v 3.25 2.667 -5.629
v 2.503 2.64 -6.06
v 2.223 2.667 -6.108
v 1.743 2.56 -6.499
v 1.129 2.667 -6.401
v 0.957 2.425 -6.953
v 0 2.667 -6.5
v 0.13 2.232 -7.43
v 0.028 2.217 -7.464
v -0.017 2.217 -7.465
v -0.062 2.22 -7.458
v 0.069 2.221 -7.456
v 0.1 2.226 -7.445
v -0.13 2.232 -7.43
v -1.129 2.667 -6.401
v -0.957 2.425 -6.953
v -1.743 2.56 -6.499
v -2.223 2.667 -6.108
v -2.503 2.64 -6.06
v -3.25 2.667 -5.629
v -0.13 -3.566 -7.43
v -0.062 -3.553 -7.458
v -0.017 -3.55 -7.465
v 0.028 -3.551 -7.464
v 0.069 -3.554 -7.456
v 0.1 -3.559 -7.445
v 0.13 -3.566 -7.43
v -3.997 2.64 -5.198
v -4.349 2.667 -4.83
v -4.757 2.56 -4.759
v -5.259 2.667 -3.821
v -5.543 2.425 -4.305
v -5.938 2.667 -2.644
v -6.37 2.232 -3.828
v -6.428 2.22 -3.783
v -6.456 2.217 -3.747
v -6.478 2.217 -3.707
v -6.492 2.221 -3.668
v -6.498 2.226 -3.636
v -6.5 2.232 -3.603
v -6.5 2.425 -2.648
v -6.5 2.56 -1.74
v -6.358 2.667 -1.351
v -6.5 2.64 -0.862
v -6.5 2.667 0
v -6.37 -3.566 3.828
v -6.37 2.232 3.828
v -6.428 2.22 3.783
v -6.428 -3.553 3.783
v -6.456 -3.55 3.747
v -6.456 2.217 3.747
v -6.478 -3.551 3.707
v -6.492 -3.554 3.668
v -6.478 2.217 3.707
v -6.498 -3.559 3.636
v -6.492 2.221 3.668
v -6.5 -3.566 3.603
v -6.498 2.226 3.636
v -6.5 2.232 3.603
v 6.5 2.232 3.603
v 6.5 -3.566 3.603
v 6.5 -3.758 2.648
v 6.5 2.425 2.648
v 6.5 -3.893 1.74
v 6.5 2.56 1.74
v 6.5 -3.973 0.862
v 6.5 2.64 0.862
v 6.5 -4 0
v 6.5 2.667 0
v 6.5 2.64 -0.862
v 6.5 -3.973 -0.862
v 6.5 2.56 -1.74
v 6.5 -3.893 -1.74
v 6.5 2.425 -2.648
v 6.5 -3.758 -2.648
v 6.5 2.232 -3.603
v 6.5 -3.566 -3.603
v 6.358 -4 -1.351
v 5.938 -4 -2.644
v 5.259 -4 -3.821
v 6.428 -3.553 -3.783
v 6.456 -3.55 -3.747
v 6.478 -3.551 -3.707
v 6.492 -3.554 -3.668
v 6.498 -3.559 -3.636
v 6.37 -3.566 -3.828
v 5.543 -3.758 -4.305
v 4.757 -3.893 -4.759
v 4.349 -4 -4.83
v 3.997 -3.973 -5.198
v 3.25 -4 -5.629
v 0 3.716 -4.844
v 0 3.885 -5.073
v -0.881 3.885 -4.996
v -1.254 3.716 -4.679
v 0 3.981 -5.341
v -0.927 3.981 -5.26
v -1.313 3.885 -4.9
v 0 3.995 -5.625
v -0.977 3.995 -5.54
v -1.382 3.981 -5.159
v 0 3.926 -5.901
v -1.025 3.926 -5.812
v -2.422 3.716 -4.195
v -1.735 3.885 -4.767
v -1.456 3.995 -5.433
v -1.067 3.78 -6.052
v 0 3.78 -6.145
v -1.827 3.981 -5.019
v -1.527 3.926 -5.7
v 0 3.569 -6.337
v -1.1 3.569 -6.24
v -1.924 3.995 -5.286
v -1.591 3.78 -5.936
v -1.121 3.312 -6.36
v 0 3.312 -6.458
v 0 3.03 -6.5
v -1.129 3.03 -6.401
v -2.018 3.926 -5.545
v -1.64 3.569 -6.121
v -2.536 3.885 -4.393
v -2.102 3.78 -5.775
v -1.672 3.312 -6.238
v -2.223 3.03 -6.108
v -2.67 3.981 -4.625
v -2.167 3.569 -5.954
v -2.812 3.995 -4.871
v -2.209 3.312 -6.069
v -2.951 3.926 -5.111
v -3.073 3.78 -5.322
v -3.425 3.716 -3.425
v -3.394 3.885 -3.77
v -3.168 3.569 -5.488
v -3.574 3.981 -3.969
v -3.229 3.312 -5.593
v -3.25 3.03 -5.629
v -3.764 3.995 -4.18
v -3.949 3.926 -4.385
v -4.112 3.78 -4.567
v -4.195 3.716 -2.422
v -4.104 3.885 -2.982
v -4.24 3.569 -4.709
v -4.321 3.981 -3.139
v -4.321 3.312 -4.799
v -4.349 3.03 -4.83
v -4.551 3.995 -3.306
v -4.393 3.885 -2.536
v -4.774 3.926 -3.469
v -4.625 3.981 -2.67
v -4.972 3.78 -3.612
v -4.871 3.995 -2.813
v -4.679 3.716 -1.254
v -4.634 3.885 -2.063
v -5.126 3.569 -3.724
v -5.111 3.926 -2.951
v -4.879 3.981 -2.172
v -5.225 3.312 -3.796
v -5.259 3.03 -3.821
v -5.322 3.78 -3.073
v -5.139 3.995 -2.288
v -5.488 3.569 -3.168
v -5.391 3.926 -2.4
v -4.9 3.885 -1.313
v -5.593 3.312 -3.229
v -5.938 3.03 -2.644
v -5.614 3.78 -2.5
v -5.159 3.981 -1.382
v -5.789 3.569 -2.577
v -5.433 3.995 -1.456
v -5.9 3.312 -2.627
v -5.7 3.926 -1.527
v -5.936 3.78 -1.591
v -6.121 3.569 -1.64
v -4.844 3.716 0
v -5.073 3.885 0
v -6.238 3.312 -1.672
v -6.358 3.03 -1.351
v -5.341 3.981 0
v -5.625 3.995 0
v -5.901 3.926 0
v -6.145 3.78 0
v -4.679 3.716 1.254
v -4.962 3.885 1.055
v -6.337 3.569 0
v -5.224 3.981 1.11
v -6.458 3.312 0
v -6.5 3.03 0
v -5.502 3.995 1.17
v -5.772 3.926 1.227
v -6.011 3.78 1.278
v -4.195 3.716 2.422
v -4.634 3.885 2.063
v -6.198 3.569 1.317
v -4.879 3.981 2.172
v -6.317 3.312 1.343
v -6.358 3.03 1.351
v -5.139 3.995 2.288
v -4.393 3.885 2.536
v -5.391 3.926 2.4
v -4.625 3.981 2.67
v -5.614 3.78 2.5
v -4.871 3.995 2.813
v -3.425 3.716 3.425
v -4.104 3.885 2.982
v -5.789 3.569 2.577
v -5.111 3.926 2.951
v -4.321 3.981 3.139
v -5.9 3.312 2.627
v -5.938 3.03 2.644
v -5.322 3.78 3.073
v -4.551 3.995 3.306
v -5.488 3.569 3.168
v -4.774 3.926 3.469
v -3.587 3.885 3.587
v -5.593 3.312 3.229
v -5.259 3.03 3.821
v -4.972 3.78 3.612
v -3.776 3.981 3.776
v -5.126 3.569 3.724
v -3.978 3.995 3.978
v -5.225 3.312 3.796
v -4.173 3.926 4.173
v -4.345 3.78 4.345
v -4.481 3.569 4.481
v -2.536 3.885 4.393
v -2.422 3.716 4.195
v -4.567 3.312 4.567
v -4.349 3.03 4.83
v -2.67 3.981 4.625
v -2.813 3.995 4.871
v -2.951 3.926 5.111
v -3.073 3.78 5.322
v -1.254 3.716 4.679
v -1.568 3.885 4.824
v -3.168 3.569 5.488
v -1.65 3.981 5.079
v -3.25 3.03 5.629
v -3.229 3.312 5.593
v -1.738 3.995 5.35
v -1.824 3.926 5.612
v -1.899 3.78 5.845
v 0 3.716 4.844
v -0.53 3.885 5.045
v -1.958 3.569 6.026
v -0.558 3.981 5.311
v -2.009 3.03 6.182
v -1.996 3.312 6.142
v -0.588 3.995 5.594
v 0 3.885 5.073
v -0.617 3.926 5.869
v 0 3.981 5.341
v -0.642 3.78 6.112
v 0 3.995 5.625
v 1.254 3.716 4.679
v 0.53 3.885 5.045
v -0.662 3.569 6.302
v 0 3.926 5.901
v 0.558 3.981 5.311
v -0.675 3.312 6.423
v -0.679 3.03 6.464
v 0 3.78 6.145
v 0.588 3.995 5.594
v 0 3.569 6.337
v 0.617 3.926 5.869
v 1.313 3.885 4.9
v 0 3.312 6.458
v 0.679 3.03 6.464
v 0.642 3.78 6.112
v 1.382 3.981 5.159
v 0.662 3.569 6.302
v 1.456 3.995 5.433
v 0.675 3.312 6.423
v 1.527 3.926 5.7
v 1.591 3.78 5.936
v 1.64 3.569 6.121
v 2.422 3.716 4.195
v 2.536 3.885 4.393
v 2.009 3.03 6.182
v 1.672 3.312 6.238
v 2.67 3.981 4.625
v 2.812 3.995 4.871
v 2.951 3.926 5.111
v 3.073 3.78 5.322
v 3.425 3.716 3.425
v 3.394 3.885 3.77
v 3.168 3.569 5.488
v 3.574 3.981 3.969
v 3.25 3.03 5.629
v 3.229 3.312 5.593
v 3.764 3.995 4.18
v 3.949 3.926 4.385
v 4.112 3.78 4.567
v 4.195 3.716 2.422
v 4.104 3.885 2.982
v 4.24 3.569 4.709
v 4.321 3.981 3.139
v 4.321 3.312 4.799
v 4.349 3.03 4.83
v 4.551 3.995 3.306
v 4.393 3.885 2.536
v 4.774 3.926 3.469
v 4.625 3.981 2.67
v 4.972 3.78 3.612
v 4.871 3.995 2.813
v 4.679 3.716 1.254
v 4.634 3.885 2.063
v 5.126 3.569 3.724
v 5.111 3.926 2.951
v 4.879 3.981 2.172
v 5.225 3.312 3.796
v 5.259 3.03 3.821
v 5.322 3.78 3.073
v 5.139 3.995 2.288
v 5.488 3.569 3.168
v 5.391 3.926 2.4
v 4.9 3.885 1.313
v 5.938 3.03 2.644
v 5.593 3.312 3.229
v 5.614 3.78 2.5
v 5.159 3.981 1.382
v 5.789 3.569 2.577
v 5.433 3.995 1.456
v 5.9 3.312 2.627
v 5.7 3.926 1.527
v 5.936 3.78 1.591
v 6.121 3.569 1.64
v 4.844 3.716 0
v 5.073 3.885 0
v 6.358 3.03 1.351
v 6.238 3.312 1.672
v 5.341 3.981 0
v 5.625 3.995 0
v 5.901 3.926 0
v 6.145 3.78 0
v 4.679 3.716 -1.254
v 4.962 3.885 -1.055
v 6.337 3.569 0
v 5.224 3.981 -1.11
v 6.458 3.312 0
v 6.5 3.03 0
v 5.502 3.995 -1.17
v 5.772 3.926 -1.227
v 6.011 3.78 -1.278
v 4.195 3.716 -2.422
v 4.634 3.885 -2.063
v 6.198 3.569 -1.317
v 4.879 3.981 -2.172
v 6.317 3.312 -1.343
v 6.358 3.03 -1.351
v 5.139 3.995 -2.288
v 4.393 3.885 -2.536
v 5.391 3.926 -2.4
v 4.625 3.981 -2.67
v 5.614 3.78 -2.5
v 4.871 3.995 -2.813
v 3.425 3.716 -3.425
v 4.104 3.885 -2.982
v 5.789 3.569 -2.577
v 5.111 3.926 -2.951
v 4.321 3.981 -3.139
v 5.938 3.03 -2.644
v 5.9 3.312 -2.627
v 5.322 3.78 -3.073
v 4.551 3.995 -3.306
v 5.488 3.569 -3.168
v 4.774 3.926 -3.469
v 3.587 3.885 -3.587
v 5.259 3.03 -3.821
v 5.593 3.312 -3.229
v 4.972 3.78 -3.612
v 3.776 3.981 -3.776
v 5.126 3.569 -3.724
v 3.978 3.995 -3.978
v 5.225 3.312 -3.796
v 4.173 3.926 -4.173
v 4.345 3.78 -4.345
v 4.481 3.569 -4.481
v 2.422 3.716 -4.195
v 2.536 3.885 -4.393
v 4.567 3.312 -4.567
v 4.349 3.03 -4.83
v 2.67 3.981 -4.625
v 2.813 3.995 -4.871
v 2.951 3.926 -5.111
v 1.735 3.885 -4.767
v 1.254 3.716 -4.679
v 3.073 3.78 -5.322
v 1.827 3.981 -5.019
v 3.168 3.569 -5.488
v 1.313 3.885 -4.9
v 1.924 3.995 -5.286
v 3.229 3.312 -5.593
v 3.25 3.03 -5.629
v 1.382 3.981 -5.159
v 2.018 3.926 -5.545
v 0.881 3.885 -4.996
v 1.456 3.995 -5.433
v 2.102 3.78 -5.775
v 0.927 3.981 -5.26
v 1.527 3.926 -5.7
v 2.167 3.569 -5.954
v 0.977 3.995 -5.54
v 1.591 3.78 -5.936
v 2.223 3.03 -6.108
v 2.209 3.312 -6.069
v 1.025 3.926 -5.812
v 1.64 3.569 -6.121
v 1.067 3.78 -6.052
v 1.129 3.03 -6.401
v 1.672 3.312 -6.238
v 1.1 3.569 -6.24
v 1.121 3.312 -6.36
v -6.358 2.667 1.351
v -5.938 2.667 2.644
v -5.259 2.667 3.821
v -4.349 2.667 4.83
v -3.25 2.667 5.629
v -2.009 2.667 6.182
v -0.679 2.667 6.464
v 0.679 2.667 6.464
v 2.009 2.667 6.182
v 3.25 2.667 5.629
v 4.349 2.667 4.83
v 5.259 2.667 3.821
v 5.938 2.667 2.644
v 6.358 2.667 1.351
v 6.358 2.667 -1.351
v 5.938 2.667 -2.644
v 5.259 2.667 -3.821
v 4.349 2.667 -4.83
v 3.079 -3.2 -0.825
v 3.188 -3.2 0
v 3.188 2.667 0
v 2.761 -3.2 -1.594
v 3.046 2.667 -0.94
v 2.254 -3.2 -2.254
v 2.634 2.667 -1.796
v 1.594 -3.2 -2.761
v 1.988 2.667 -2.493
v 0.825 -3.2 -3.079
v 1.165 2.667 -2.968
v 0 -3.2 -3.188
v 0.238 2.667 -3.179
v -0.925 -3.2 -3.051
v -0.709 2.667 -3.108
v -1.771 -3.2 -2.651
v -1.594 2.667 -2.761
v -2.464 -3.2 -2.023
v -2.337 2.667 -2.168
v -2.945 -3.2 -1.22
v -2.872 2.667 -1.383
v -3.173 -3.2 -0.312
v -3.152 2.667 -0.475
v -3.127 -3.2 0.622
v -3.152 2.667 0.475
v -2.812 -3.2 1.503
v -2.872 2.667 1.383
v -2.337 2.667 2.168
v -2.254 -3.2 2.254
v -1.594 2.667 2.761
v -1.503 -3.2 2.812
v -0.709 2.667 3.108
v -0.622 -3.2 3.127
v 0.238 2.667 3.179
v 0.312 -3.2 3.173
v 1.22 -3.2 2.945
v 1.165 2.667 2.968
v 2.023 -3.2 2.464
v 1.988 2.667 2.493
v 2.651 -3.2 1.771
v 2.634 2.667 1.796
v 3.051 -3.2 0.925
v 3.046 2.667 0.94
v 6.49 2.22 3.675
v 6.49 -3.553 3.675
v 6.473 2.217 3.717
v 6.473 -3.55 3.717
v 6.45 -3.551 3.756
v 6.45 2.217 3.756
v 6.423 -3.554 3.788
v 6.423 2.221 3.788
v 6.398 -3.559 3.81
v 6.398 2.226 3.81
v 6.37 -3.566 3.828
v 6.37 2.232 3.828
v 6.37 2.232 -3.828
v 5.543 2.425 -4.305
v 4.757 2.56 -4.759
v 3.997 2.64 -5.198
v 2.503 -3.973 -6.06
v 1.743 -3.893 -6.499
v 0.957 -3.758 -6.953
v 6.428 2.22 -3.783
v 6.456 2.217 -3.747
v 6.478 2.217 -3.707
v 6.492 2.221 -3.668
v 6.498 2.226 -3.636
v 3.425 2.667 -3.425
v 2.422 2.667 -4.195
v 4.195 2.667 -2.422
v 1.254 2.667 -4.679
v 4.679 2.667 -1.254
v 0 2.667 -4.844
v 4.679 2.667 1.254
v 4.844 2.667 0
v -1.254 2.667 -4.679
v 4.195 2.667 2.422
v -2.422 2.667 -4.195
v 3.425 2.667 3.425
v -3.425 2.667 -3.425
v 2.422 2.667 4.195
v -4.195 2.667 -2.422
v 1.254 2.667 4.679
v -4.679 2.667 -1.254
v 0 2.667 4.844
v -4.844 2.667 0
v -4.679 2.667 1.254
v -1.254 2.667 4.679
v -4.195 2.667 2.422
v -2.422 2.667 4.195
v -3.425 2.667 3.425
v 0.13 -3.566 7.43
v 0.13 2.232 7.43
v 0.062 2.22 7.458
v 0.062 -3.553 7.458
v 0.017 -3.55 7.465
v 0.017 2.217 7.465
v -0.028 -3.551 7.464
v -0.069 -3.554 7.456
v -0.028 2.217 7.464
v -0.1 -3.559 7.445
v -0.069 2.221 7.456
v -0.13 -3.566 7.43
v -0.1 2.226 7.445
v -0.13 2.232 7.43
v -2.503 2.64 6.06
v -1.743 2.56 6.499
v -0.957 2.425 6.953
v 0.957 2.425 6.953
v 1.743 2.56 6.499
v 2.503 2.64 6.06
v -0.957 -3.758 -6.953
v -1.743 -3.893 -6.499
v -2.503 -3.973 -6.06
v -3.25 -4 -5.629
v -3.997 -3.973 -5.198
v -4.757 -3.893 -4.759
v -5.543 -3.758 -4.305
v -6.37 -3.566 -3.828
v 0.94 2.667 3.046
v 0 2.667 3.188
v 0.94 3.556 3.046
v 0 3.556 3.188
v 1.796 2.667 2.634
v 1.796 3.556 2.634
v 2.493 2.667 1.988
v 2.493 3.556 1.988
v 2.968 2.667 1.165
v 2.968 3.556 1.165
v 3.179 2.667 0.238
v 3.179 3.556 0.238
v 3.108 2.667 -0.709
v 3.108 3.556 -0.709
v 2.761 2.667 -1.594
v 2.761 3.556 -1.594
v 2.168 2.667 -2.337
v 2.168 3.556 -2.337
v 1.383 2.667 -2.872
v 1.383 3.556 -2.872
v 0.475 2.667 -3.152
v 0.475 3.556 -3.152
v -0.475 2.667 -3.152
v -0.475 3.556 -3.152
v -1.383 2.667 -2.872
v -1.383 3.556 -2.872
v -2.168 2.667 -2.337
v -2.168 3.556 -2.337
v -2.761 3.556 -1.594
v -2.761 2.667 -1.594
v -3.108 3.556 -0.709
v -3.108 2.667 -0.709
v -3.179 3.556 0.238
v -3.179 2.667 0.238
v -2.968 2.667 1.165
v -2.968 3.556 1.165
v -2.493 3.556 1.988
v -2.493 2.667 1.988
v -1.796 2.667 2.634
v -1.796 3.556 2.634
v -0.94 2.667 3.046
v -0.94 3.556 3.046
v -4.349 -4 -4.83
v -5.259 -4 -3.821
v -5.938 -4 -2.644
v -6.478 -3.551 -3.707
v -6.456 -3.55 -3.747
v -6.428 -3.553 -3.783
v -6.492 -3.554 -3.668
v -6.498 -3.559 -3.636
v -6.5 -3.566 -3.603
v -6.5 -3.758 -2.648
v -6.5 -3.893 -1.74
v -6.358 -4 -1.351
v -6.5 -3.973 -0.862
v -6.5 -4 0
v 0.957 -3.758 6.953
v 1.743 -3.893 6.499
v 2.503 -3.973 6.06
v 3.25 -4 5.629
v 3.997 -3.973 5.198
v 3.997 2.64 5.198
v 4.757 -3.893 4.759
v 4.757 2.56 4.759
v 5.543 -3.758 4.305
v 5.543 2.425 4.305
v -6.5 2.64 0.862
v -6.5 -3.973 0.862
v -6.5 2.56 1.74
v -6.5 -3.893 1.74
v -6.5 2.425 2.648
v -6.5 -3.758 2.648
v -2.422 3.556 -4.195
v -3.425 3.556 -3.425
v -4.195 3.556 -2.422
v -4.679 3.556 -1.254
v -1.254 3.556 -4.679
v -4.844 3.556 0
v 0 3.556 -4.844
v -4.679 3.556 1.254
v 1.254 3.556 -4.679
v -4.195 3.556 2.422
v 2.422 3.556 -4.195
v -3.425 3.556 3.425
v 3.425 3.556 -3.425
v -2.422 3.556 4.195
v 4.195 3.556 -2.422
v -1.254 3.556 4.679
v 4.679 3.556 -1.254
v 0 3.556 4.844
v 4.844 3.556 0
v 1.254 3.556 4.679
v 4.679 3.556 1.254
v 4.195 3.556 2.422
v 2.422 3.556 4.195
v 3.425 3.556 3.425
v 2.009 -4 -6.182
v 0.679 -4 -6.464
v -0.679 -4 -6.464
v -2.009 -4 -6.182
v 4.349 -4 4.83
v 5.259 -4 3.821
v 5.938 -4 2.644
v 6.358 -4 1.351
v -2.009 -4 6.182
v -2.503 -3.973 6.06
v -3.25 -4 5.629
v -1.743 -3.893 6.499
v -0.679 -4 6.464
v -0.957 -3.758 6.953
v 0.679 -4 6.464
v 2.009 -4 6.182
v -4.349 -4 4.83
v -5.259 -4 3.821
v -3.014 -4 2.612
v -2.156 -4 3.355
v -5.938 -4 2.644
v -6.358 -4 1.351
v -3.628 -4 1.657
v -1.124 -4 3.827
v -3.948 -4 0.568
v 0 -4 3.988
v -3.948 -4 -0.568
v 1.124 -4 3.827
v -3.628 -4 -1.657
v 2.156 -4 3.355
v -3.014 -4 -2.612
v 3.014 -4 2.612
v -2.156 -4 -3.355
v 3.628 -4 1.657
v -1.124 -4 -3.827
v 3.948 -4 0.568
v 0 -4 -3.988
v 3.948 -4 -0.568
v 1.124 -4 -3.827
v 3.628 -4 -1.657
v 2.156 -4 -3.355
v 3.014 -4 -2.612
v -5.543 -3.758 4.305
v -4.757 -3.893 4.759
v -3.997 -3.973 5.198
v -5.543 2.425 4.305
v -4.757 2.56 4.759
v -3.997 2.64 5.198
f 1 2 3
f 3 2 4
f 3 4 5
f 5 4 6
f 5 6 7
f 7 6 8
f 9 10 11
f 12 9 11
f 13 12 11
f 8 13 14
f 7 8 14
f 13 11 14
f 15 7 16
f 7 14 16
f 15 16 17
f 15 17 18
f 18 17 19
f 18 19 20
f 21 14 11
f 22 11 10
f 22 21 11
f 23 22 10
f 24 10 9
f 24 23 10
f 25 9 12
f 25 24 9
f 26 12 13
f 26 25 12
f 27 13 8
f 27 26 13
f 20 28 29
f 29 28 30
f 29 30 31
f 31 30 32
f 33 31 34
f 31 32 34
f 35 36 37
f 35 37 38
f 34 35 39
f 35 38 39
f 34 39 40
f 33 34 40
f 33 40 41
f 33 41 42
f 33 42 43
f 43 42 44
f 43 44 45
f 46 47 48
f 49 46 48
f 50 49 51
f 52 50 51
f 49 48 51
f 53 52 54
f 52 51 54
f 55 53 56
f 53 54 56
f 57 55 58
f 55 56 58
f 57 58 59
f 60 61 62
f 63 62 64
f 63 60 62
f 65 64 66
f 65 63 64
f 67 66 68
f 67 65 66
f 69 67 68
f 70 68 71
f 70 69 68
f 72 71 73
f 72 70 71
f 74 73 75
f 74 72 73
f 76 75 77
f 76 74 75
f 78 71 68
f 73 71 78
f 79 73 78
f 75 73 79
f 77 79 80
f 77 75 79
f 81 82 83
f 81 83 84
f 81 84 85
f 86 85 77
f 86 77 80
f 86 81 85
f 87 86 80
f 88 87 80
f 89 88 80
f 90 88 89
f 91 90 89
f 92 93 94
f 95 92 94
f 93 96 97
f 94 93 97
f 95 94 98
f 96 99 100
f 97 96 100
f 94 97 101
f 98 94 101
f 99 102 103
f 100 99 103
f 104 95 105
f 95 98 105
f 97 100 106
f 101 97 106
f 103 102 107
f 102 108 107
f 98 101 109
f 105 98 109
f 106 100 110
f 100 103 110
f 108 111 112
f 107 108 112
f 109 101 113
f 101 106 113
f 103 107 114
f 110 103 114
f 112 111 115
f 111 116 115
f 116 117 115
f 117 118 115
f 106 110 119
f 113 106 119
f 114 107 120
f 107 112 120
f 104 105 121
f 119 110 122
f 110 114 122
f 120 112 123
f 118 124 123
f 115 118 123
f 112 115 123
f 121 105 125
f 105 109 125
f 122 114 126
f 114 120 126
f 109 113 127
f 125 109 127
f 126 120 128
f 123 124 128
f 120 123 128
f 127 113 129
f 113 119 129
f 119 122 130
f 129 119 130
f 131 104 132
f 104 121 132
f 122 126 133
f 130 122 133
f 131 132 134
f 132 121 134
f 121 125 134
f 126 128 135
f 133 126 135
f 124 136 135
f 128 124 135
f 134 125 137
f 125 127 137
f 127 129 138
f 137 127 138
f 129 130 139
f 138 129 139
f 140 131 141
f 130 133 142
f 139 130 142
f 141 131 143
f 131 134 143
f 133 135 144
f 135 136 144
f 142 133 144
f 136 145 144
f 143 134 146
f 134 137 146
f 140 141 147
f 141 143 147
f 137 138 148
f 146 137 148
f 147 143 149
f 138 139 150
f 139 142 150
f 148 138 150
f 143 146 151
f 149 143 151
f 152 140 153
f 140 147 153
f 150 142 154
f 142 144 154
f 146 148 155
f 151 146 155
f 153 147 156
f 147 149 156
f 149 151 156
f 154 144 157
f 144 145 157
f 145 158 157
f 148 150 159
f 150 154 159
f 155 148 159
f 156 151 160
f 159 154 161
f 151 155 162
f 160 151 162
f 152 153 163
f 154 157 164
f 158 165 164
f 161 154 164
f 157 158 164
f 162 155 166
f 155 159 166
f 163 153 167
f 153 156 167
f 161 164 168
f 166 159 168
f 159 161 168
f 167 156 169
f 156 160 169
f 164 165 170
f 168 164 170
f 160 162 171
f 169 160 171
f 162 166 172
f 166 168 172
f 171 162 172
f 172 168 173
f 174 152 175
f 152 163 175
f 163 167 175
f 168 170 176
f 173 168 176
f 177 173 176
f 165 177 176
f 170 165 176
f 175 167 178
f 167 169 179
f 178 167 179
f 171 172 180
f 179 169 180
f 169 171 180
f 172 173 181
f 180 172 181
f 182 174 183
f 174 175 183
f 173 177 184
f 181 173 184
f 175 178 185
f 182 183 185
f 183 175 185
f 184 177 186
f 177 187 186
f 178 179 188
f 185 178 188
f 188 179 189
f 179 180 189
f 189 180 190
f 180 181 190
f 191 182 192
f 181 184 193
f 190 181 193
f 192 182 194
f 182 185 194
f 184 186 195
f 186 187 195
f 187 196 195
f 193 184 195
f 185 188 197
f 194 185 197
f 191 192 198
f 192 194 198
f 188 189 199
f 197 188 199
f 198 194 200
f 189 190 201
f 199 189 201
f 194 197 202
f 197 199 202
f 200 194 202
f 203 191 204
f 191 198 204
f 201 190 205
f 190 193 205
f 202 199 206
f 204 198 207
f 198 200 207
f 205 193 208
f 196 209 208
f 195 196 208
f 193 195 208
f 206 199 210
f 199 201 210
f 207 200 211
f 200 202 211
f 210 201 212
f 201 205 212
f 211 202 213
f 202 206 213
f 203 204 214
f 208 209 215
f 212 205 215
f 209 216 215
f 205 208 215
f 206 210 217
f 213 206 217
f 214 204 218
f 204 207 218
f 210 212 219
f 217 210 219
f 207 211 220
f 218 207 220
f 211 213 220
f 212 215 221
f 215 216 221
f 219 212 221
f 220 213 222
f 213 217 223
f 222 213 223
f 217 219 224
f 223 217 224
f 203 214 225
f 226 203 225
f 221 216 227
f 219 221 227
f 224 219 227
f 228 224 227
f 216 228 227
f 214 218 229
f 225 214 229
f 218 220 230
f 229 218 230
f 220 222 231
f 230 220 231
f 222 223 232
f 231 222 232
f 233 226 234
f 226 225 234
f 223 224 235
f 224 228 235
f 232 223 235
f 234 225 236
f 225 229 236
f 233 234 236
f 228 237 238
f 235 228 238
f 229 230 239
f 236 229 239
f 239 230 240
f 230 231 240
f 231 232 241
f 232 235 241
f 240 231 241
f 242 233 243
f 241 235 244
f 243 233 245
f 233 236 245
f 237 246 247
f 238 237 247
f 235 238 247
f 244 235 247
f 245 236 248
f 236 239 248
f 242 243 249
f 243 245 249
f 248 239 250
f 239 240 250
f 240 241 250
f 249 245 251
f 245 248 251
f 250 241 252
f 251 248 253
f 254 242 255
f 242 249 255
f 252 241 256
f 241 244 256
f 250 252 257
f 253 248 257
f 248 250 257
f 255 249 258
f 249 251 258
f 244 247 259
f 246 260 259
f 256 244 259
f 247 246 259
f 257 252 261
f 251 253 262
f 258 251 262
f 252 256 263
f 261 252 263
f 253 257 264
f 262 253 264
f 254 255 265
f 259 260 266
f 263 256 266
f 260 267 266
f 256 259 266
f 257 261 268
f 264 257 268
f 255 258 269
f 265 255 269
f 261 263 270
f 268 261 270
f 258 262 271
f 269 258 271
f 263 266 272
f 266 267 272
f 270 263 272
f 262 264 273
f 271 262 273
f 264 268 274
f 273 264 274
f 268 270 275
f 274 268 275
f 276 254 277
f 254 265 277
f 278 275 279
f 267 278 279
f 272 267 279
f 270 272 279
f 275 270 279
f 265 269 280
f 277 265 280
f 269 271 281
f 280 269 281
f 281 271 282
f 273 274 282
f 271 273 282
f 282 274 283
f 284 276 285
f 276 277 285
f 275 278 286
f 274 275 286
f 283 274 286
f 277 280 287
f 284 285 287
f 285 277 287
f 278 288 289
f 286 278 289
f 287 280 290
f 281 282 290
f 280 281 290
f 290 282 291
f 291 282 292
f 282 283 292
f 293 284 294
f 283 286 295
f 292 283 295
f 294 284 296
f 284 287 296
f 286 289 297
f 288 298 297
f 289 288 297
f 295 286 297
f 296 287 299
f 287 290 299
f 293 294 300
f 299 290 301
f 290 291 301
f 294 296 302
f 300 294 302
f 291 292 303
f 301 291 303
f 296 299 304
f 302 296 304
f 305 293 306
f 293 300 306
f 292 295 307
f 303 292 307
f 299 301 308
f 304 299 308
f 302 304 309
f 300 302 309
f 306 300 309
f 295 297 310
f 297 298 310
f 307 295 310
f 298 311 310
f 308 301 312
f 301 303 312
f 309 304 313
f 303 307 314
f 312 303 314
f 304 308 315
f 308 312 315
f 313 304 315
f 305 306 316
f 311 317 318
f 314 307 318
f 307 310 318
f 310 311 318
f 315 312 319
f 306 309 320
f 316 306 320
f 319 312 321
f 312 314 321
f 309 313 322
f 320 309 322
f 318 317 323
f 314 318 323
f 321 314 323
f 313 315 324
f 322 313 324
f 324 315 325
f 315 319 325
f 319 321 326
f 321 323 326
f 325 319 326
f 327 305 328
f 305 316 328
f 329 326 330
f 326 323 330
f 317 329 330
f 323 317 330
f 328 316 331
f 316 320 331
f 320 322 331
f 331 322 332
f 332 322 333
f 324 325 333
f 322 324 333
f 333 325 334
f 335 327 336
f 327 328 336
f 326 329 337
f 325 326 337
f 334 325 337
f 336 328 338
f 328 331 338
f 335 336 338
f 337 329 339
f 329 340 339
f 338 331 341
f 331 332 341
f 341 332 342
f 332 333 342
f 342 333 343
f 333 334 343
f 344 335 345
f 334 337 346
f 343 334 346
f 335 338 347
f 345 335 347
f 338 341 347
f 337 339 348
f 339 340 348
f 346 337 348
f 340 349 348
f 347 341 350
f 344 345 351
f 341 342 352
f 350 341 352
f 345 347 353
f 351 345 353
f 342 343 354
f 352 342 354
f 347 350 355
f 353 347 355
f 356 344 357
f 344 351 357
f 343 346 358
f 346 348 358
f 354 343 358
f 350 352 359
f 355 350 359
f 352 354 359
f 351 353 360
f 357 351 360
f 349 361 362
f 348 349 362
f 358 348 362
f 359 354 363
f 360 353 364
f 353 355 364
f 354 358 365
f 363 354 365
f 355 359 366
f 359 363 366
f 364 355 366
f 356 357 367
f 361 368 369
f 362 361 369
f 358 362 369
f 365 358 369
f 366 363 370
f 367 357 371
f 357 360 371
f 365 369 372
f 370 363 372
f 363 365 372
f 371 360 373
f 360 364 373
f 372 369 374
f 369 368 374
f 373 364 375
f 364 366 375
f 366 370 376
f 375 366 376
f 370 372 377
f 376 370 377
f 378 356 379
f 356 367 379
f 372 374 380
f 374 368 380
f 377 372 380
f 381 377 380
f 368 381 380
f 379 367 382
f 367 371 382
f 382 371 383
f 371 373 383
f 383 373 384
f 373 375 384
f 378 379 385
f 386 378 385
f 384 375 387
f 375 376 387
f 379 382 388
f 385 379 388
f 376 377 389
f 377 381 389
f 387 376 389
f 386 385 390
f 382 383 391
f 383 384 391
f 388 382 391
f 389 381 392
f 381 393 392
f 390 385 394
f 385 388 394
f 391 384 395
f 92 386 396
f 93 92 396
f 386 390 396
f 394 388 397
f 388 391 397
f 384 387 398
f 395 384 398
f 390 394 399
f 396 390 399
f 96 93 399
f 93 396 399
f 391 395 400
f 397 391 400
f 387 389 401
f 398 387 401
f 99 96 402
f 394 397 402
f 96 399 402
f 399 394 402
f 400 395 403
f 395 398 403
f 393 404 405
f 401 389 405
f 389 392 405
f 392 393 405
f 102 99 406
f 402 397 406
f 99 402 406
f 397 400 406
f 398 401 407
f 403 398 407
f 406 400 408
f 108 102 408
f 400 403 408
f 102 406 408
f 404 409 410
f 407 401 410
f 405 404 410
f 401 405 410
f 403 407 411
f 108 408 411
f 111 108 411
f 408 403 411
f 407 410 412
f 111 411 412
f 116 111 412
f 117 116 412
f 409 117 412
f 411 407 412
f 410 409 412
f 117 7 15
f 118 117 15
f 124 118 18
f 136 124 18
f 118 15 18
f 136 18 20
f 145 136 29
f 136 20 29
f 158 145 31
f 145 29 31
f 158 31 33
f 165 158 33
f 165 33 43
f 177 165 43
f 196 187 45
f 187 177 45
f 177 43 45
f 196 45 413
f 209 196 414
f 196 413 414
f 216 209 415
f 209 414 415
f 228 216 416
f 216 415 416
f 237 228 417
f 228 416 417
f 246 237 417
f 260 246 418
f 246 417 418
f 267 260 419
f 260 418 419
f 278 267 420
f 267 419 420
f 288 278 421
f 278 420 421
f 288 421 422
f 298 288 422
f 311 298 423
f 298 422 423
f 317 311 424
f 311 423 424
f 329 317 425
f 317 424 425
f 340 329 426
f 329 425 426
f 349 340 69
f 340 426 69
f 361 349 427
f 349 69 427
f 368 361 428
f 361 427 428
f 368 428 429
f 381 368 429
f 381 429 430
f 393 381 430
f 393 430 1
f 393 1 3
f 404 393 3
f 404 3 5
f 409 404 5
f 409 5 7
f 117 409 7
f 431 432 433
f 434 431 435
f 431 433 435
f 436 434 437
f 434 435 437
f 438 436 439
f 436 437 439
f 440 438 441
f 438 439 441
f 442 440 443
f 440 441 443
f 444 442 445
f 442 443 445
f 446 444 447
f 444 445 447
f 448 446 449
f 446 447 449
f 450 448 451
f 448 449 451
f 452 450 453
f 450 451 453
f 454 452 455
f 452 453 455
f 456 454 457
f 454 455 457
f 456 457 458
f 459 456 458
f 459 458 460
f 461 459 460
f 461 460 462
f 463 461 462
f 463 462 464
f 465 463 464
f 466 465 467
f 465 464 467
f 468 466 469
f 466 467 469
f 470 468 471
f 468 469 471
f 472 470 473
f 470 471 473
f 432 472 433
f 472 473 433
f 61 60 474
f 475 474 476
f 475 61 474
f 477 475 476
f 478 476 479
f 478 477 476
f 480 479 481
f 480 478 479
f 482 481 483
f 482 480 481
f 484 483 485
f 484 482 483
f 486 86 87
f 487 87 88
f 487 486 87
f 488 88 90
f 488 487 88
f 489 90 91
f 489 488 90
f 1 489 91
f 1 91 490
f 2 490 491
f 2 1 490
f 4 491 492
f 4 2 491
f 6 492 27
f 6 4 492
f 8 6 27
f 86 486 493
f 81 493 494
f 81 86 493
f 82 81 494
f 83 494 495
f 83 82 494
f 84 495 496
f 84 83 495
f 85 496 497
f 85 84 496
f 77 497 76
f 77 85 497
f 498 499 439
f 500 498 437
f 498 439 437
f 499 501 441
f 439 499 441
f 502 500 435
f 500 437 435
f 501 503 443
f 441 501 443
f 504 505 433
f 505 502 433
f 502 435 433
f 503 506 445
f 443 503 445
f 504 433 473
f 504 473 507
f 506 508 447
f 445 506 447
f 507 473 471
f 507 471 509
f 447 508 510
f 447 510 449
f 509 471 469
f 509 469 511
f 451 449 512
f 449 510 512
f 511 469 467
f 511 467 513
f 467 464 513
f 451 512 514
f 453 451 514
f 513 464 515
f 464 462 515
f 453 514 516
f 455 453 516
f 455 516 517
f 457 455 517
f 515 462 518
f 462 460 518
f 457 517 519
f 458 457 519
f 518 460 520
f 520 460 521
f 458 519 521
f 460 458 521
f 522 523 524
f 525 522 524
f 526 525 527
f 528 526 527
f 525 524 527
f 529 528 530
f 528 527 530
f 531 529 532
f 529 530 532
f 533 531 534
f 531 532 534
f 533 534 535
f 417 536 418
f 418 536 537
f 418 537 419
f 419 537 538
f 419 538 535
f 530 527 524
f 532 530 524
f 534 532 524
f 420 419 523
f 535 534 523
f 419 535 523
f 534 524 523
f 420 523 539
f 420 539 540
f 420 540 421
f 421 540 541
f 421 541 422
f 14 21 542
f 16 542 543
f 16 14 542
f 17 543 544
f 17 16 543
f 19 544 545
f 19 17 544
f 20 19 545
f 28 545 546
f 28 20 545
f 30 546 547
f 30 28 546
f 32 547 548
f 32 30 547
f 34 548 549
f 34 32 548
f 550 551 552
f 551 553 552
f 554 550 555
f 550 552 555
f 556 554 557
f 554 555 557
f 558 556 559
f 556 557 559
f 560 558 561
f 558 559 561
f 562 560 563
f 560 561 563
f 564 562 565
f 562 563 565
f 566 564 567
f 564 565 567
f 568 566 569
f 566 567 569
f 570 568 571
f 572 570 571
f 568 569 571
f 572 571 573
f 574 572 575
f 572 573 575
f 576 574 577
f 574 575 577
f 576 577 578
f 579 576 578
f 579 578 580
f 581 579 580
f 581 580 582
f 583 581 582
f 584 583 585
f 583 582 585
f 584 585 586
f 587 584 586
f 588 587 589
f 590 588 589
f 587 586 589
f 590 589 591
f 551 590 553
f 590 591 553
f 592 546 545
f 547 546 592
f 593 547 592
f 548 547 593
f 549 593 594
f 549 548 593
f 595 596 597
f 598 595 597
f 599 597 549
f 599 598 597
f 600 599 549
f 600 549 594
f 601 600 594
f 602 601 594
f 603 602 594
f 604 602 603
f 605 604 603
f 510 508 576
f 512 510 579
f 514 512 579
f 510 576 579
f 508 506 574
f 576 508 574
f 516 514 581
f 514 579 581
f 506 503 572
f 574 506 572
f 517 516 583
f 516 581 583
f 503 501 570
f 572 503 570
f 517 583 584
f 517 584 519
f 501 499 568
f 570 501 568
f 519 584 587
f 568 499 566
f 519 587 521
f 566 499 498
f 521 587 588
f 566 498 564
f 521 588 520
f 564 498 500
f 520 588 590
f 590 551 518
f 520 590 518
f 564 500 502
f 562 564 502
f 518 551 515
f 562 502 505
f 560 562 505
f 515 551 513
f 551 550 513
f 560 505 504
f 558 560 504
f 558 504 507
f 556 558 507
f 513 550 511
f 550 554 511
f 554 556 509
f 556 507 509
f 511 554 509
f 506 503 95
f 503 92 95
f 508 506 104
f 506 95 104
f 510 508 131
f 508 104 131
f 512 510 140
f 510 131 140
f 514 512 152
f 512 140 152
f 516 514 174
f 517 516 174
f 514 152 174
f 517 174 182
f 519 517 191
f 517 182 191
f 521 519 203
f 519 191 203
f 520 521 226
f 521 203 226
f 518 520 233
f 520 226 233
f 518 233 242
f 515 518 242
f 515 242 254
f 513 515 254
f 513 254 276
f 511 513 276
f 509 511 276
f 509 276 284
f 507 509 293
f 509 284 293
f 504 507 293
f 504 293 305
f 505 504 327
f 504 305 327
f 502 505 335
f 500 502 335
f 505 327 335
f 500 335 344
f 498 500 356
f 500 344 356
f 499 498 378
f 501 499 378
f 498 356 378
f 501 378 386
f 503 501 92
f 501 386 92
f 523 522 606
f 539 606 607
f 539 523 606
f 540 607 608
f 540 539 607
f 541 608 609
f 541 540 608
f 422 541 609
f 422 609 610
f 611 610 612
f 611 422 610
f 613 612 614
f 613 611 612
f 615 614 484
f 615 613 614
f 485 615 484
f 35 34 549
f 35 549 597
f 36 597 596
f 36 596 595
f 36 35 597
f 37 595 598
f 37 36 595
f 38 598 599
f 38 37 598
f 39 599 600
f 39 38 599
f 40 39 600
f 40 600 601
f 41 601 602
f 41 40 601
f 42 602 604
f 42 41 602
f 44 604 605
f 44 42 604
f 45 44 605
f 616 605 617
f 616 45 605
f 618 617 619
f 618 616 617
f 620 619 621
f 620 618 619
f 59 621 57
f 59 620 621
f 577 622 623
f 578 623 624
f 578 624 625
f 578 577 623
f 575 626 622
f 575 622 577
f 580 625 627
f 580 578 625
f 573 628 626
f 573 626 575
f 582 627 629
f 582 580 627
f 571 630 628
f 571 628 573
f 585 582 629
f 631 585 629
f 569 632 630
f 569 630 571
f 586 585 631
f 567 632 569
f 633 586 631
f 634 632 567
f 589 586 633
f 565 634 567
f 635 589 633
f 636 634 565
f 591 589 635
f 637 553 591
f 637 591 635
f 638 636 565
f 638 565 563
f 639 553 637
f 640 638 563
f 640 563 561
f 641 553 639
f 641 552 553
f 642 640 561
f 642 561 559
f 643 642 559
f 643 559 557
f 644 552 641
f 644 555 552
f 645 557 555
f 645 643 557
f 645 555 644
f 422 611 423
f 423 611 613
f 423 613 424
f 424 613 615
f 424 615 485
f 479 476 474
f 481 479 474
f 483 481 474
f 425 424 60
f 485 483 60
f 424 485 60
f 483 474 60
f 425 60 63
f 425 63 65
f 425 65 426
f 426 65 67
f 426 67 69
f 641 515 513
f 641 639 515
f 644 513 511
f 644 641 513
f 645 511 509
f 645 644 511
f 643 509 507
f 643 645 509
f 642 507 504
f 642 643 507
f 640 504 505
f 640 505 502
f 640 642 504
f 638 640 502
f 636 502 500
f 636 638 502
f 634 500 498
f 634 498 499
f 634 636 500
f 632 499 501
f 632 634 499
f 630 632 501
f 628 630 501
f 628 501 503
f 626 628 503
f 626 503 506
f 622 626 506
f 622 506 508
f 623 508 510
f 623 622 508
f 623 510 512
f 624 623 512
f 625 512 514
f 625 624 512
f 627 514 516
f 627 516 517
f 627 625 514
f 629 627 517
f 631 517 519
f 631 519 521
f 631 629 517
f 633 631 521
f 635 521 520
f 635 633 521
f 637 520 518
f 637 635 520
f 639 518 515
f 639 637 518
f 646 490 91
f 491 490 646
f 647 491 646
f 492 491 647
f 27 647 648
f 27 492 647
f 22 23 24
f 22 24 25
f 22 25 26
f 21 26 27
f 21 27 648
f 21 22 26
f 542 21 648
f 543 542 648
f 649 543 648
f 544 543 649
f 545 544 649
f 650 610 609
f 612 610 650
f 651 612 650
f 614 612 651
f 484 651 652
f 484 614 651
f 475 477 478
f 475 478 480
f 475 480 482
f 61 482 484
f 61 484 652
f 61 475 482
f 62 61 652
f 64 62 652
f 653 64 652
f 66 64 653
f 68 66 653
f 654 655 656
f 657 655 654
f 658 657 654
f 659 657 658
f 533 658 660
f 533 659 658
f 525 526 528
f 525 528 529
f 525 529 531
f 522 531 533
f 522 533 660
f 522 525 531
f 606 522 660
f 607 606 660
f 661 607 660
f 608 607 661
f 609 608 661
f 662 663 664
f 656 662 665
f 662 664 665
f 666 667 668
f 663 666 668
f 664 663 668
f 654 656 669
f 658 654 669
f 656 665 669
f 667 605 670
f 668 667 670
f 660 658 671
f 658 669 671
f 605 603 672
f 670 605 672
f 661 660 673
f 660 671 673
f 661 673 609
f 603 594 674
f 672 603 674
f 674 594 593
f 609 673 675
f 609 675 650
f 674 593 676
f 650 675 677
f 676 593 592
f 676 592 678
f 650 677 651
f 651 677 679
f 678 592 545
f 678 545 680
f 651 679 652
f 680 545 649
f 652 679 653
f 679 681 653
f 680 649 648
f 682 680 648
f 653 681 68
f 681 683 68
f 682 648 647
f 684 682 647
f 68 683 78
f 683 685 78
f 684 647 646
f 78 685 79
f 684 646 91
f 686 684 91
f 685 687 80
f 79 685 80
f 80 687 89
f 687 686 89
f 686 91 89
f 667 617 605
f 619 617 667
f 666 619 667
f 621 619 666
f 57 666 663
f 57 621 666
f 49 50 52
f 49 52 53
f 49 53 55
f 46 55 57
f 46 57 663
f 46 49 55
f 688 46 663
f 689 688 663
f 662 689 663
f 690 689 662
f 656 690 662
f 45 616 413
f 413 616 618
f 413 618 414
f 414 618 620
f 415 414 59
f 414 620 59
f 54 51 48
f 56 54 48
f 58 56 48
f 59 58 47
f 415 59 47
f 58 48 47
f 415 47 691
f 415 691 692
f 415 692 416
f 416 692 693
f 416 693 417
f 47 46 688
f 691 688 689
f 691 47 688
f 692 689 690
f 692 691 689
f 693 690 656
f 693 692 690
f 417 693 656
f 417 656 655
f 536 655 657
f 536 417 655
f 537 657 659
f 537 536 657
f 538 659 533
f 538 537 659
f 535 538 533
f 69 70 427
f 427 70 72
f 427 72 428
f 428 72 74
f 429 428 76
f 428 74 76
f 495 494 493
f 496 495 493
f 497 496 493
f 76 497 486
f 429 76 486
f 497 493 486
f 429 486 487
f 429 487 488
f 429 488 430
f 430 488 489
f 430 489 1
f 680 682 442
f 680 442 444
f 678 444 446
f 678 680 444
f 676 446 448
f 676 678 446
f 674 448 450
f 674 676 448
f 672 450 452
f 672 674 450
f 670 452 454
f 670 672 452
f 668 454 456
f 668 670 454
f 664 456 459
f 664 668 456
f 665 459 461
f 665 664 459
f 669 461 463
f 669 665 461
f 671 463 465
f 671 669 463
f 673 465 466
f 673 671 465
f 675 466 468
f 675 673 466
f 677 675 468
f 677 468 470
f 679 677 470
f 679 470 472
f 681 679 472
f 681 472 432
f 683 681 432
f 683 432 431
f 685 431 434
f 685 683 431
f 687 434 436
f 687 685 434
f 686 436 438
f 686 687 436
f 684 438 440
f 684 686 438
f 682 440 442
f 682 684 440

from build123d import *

# Parameters (mm, degrees)
SKETCH2_R                = 3.188101184
BOSS_EXTRUDE1_DEPTH      = 4
BOSS_EXTRUDE1_DEPTH_BACK = 4
FILLET1_R                = 0.26
SKETCH4_W                = 1.655949408
SKETCH4_H                = 0.889217332


with BuildPart() as part:
    # Sketch2 → Boss-Extrude1 (new body, two sides)
    with BuildSketch(Plane(origin=(0, 0, 0), x_dir=(1, 0, 0), z_dir=(0, 1, 0))) as boss_extrude1_sk:
        Polygon((0, 7.505553499), (-6.5, 3.75277675), (-6.5, -3.75277675), (0, -7.505553499), (6.5, -3.75277675), (6.5, 3.75277675), align=None)
        Circle(SKETCH2_R, mode=Mode.SUBTRACT)
    extrude(amount=BOSS_EXTRUDE1_DEPTH)
    extrude(boss_extrude1_sk.sketch, amount=-BOSS_EXTRUDE1_DEPTH_BACK)

    # Fillet1
    fillet1_edges = [part.edges().sort_by_distance(p)[0] for p in [
        (6.5, 0, -3.75277675),
        (6.5, 0, 3.75277675),
        (0, 0, 7.505553499),
        (-6.5, 0, 3.75277675),
        (-6.5, 0, -3.75277675),
        (0, 0, -7.505553499),
    ]]
    fillet(fillet1_edges, radius=FILLET1_R)

    # Sketch3 → Cut-Revolve2 (revolve, cut)
    with BuildSketch(Plane(origin=(0, 0, 0), x_dir=(0, 0, -1), z_dir=(1, 0, 0))):
        with BuildLine():
            Line((7.505553499, 2.666666667), (7.505553499, 5))
            Line((7.505553499, 5), (3.188101184, 5))
            Line((3.188101184, 5), (3.188101184, 2.666666667))
            Line((3.188101184, 2.666666667), (4.844050592, 2.666666667))
            Line((4.844050592, 2.666666667), (4.844050592, 3.715883999))
            ThreePointArc((4.844050592, 3.715883999), (5.90118274, 3.926160657), (6.5, 3.029967295))
            Line((6.5, 3.029967295), (6.5, 2.666666667))
            Line((6.5, 2.666666667), (7.505553499, 2.197769369))
            Line((7.505553499, 2.197769369), (7.505553499, 2.666666667))
        make_face()
        Polygon((6.5, -4), (7.505553499, -3.531102703), (7.505553499, -4), align=None)
        Polygon((3.188101184, -4), (3.188101184, -3.2), (3.988101184, -4), align=None)
    revolve(axis=Axis((0, -4, 0), (0, 1, 0)), mode=Mode.SUBTRACT)


with BuildPart() as body_2:
    # Sketch4 → Revolve1 (revolve)
    with BuildSketch(Plane(origin=(0, 0, 0), x_dir=(0, 0, -1), z_dir=(1, 0, 0))):
        with Locations((-4.016075888, 3.111275333)):
            Rectangle(SKETCH4_W, SKETCH4_H)
    revolve(axis=Axis((0, -4, 0), (0, 1, 0)))


solid = Compound([part.part, body_2.part])
